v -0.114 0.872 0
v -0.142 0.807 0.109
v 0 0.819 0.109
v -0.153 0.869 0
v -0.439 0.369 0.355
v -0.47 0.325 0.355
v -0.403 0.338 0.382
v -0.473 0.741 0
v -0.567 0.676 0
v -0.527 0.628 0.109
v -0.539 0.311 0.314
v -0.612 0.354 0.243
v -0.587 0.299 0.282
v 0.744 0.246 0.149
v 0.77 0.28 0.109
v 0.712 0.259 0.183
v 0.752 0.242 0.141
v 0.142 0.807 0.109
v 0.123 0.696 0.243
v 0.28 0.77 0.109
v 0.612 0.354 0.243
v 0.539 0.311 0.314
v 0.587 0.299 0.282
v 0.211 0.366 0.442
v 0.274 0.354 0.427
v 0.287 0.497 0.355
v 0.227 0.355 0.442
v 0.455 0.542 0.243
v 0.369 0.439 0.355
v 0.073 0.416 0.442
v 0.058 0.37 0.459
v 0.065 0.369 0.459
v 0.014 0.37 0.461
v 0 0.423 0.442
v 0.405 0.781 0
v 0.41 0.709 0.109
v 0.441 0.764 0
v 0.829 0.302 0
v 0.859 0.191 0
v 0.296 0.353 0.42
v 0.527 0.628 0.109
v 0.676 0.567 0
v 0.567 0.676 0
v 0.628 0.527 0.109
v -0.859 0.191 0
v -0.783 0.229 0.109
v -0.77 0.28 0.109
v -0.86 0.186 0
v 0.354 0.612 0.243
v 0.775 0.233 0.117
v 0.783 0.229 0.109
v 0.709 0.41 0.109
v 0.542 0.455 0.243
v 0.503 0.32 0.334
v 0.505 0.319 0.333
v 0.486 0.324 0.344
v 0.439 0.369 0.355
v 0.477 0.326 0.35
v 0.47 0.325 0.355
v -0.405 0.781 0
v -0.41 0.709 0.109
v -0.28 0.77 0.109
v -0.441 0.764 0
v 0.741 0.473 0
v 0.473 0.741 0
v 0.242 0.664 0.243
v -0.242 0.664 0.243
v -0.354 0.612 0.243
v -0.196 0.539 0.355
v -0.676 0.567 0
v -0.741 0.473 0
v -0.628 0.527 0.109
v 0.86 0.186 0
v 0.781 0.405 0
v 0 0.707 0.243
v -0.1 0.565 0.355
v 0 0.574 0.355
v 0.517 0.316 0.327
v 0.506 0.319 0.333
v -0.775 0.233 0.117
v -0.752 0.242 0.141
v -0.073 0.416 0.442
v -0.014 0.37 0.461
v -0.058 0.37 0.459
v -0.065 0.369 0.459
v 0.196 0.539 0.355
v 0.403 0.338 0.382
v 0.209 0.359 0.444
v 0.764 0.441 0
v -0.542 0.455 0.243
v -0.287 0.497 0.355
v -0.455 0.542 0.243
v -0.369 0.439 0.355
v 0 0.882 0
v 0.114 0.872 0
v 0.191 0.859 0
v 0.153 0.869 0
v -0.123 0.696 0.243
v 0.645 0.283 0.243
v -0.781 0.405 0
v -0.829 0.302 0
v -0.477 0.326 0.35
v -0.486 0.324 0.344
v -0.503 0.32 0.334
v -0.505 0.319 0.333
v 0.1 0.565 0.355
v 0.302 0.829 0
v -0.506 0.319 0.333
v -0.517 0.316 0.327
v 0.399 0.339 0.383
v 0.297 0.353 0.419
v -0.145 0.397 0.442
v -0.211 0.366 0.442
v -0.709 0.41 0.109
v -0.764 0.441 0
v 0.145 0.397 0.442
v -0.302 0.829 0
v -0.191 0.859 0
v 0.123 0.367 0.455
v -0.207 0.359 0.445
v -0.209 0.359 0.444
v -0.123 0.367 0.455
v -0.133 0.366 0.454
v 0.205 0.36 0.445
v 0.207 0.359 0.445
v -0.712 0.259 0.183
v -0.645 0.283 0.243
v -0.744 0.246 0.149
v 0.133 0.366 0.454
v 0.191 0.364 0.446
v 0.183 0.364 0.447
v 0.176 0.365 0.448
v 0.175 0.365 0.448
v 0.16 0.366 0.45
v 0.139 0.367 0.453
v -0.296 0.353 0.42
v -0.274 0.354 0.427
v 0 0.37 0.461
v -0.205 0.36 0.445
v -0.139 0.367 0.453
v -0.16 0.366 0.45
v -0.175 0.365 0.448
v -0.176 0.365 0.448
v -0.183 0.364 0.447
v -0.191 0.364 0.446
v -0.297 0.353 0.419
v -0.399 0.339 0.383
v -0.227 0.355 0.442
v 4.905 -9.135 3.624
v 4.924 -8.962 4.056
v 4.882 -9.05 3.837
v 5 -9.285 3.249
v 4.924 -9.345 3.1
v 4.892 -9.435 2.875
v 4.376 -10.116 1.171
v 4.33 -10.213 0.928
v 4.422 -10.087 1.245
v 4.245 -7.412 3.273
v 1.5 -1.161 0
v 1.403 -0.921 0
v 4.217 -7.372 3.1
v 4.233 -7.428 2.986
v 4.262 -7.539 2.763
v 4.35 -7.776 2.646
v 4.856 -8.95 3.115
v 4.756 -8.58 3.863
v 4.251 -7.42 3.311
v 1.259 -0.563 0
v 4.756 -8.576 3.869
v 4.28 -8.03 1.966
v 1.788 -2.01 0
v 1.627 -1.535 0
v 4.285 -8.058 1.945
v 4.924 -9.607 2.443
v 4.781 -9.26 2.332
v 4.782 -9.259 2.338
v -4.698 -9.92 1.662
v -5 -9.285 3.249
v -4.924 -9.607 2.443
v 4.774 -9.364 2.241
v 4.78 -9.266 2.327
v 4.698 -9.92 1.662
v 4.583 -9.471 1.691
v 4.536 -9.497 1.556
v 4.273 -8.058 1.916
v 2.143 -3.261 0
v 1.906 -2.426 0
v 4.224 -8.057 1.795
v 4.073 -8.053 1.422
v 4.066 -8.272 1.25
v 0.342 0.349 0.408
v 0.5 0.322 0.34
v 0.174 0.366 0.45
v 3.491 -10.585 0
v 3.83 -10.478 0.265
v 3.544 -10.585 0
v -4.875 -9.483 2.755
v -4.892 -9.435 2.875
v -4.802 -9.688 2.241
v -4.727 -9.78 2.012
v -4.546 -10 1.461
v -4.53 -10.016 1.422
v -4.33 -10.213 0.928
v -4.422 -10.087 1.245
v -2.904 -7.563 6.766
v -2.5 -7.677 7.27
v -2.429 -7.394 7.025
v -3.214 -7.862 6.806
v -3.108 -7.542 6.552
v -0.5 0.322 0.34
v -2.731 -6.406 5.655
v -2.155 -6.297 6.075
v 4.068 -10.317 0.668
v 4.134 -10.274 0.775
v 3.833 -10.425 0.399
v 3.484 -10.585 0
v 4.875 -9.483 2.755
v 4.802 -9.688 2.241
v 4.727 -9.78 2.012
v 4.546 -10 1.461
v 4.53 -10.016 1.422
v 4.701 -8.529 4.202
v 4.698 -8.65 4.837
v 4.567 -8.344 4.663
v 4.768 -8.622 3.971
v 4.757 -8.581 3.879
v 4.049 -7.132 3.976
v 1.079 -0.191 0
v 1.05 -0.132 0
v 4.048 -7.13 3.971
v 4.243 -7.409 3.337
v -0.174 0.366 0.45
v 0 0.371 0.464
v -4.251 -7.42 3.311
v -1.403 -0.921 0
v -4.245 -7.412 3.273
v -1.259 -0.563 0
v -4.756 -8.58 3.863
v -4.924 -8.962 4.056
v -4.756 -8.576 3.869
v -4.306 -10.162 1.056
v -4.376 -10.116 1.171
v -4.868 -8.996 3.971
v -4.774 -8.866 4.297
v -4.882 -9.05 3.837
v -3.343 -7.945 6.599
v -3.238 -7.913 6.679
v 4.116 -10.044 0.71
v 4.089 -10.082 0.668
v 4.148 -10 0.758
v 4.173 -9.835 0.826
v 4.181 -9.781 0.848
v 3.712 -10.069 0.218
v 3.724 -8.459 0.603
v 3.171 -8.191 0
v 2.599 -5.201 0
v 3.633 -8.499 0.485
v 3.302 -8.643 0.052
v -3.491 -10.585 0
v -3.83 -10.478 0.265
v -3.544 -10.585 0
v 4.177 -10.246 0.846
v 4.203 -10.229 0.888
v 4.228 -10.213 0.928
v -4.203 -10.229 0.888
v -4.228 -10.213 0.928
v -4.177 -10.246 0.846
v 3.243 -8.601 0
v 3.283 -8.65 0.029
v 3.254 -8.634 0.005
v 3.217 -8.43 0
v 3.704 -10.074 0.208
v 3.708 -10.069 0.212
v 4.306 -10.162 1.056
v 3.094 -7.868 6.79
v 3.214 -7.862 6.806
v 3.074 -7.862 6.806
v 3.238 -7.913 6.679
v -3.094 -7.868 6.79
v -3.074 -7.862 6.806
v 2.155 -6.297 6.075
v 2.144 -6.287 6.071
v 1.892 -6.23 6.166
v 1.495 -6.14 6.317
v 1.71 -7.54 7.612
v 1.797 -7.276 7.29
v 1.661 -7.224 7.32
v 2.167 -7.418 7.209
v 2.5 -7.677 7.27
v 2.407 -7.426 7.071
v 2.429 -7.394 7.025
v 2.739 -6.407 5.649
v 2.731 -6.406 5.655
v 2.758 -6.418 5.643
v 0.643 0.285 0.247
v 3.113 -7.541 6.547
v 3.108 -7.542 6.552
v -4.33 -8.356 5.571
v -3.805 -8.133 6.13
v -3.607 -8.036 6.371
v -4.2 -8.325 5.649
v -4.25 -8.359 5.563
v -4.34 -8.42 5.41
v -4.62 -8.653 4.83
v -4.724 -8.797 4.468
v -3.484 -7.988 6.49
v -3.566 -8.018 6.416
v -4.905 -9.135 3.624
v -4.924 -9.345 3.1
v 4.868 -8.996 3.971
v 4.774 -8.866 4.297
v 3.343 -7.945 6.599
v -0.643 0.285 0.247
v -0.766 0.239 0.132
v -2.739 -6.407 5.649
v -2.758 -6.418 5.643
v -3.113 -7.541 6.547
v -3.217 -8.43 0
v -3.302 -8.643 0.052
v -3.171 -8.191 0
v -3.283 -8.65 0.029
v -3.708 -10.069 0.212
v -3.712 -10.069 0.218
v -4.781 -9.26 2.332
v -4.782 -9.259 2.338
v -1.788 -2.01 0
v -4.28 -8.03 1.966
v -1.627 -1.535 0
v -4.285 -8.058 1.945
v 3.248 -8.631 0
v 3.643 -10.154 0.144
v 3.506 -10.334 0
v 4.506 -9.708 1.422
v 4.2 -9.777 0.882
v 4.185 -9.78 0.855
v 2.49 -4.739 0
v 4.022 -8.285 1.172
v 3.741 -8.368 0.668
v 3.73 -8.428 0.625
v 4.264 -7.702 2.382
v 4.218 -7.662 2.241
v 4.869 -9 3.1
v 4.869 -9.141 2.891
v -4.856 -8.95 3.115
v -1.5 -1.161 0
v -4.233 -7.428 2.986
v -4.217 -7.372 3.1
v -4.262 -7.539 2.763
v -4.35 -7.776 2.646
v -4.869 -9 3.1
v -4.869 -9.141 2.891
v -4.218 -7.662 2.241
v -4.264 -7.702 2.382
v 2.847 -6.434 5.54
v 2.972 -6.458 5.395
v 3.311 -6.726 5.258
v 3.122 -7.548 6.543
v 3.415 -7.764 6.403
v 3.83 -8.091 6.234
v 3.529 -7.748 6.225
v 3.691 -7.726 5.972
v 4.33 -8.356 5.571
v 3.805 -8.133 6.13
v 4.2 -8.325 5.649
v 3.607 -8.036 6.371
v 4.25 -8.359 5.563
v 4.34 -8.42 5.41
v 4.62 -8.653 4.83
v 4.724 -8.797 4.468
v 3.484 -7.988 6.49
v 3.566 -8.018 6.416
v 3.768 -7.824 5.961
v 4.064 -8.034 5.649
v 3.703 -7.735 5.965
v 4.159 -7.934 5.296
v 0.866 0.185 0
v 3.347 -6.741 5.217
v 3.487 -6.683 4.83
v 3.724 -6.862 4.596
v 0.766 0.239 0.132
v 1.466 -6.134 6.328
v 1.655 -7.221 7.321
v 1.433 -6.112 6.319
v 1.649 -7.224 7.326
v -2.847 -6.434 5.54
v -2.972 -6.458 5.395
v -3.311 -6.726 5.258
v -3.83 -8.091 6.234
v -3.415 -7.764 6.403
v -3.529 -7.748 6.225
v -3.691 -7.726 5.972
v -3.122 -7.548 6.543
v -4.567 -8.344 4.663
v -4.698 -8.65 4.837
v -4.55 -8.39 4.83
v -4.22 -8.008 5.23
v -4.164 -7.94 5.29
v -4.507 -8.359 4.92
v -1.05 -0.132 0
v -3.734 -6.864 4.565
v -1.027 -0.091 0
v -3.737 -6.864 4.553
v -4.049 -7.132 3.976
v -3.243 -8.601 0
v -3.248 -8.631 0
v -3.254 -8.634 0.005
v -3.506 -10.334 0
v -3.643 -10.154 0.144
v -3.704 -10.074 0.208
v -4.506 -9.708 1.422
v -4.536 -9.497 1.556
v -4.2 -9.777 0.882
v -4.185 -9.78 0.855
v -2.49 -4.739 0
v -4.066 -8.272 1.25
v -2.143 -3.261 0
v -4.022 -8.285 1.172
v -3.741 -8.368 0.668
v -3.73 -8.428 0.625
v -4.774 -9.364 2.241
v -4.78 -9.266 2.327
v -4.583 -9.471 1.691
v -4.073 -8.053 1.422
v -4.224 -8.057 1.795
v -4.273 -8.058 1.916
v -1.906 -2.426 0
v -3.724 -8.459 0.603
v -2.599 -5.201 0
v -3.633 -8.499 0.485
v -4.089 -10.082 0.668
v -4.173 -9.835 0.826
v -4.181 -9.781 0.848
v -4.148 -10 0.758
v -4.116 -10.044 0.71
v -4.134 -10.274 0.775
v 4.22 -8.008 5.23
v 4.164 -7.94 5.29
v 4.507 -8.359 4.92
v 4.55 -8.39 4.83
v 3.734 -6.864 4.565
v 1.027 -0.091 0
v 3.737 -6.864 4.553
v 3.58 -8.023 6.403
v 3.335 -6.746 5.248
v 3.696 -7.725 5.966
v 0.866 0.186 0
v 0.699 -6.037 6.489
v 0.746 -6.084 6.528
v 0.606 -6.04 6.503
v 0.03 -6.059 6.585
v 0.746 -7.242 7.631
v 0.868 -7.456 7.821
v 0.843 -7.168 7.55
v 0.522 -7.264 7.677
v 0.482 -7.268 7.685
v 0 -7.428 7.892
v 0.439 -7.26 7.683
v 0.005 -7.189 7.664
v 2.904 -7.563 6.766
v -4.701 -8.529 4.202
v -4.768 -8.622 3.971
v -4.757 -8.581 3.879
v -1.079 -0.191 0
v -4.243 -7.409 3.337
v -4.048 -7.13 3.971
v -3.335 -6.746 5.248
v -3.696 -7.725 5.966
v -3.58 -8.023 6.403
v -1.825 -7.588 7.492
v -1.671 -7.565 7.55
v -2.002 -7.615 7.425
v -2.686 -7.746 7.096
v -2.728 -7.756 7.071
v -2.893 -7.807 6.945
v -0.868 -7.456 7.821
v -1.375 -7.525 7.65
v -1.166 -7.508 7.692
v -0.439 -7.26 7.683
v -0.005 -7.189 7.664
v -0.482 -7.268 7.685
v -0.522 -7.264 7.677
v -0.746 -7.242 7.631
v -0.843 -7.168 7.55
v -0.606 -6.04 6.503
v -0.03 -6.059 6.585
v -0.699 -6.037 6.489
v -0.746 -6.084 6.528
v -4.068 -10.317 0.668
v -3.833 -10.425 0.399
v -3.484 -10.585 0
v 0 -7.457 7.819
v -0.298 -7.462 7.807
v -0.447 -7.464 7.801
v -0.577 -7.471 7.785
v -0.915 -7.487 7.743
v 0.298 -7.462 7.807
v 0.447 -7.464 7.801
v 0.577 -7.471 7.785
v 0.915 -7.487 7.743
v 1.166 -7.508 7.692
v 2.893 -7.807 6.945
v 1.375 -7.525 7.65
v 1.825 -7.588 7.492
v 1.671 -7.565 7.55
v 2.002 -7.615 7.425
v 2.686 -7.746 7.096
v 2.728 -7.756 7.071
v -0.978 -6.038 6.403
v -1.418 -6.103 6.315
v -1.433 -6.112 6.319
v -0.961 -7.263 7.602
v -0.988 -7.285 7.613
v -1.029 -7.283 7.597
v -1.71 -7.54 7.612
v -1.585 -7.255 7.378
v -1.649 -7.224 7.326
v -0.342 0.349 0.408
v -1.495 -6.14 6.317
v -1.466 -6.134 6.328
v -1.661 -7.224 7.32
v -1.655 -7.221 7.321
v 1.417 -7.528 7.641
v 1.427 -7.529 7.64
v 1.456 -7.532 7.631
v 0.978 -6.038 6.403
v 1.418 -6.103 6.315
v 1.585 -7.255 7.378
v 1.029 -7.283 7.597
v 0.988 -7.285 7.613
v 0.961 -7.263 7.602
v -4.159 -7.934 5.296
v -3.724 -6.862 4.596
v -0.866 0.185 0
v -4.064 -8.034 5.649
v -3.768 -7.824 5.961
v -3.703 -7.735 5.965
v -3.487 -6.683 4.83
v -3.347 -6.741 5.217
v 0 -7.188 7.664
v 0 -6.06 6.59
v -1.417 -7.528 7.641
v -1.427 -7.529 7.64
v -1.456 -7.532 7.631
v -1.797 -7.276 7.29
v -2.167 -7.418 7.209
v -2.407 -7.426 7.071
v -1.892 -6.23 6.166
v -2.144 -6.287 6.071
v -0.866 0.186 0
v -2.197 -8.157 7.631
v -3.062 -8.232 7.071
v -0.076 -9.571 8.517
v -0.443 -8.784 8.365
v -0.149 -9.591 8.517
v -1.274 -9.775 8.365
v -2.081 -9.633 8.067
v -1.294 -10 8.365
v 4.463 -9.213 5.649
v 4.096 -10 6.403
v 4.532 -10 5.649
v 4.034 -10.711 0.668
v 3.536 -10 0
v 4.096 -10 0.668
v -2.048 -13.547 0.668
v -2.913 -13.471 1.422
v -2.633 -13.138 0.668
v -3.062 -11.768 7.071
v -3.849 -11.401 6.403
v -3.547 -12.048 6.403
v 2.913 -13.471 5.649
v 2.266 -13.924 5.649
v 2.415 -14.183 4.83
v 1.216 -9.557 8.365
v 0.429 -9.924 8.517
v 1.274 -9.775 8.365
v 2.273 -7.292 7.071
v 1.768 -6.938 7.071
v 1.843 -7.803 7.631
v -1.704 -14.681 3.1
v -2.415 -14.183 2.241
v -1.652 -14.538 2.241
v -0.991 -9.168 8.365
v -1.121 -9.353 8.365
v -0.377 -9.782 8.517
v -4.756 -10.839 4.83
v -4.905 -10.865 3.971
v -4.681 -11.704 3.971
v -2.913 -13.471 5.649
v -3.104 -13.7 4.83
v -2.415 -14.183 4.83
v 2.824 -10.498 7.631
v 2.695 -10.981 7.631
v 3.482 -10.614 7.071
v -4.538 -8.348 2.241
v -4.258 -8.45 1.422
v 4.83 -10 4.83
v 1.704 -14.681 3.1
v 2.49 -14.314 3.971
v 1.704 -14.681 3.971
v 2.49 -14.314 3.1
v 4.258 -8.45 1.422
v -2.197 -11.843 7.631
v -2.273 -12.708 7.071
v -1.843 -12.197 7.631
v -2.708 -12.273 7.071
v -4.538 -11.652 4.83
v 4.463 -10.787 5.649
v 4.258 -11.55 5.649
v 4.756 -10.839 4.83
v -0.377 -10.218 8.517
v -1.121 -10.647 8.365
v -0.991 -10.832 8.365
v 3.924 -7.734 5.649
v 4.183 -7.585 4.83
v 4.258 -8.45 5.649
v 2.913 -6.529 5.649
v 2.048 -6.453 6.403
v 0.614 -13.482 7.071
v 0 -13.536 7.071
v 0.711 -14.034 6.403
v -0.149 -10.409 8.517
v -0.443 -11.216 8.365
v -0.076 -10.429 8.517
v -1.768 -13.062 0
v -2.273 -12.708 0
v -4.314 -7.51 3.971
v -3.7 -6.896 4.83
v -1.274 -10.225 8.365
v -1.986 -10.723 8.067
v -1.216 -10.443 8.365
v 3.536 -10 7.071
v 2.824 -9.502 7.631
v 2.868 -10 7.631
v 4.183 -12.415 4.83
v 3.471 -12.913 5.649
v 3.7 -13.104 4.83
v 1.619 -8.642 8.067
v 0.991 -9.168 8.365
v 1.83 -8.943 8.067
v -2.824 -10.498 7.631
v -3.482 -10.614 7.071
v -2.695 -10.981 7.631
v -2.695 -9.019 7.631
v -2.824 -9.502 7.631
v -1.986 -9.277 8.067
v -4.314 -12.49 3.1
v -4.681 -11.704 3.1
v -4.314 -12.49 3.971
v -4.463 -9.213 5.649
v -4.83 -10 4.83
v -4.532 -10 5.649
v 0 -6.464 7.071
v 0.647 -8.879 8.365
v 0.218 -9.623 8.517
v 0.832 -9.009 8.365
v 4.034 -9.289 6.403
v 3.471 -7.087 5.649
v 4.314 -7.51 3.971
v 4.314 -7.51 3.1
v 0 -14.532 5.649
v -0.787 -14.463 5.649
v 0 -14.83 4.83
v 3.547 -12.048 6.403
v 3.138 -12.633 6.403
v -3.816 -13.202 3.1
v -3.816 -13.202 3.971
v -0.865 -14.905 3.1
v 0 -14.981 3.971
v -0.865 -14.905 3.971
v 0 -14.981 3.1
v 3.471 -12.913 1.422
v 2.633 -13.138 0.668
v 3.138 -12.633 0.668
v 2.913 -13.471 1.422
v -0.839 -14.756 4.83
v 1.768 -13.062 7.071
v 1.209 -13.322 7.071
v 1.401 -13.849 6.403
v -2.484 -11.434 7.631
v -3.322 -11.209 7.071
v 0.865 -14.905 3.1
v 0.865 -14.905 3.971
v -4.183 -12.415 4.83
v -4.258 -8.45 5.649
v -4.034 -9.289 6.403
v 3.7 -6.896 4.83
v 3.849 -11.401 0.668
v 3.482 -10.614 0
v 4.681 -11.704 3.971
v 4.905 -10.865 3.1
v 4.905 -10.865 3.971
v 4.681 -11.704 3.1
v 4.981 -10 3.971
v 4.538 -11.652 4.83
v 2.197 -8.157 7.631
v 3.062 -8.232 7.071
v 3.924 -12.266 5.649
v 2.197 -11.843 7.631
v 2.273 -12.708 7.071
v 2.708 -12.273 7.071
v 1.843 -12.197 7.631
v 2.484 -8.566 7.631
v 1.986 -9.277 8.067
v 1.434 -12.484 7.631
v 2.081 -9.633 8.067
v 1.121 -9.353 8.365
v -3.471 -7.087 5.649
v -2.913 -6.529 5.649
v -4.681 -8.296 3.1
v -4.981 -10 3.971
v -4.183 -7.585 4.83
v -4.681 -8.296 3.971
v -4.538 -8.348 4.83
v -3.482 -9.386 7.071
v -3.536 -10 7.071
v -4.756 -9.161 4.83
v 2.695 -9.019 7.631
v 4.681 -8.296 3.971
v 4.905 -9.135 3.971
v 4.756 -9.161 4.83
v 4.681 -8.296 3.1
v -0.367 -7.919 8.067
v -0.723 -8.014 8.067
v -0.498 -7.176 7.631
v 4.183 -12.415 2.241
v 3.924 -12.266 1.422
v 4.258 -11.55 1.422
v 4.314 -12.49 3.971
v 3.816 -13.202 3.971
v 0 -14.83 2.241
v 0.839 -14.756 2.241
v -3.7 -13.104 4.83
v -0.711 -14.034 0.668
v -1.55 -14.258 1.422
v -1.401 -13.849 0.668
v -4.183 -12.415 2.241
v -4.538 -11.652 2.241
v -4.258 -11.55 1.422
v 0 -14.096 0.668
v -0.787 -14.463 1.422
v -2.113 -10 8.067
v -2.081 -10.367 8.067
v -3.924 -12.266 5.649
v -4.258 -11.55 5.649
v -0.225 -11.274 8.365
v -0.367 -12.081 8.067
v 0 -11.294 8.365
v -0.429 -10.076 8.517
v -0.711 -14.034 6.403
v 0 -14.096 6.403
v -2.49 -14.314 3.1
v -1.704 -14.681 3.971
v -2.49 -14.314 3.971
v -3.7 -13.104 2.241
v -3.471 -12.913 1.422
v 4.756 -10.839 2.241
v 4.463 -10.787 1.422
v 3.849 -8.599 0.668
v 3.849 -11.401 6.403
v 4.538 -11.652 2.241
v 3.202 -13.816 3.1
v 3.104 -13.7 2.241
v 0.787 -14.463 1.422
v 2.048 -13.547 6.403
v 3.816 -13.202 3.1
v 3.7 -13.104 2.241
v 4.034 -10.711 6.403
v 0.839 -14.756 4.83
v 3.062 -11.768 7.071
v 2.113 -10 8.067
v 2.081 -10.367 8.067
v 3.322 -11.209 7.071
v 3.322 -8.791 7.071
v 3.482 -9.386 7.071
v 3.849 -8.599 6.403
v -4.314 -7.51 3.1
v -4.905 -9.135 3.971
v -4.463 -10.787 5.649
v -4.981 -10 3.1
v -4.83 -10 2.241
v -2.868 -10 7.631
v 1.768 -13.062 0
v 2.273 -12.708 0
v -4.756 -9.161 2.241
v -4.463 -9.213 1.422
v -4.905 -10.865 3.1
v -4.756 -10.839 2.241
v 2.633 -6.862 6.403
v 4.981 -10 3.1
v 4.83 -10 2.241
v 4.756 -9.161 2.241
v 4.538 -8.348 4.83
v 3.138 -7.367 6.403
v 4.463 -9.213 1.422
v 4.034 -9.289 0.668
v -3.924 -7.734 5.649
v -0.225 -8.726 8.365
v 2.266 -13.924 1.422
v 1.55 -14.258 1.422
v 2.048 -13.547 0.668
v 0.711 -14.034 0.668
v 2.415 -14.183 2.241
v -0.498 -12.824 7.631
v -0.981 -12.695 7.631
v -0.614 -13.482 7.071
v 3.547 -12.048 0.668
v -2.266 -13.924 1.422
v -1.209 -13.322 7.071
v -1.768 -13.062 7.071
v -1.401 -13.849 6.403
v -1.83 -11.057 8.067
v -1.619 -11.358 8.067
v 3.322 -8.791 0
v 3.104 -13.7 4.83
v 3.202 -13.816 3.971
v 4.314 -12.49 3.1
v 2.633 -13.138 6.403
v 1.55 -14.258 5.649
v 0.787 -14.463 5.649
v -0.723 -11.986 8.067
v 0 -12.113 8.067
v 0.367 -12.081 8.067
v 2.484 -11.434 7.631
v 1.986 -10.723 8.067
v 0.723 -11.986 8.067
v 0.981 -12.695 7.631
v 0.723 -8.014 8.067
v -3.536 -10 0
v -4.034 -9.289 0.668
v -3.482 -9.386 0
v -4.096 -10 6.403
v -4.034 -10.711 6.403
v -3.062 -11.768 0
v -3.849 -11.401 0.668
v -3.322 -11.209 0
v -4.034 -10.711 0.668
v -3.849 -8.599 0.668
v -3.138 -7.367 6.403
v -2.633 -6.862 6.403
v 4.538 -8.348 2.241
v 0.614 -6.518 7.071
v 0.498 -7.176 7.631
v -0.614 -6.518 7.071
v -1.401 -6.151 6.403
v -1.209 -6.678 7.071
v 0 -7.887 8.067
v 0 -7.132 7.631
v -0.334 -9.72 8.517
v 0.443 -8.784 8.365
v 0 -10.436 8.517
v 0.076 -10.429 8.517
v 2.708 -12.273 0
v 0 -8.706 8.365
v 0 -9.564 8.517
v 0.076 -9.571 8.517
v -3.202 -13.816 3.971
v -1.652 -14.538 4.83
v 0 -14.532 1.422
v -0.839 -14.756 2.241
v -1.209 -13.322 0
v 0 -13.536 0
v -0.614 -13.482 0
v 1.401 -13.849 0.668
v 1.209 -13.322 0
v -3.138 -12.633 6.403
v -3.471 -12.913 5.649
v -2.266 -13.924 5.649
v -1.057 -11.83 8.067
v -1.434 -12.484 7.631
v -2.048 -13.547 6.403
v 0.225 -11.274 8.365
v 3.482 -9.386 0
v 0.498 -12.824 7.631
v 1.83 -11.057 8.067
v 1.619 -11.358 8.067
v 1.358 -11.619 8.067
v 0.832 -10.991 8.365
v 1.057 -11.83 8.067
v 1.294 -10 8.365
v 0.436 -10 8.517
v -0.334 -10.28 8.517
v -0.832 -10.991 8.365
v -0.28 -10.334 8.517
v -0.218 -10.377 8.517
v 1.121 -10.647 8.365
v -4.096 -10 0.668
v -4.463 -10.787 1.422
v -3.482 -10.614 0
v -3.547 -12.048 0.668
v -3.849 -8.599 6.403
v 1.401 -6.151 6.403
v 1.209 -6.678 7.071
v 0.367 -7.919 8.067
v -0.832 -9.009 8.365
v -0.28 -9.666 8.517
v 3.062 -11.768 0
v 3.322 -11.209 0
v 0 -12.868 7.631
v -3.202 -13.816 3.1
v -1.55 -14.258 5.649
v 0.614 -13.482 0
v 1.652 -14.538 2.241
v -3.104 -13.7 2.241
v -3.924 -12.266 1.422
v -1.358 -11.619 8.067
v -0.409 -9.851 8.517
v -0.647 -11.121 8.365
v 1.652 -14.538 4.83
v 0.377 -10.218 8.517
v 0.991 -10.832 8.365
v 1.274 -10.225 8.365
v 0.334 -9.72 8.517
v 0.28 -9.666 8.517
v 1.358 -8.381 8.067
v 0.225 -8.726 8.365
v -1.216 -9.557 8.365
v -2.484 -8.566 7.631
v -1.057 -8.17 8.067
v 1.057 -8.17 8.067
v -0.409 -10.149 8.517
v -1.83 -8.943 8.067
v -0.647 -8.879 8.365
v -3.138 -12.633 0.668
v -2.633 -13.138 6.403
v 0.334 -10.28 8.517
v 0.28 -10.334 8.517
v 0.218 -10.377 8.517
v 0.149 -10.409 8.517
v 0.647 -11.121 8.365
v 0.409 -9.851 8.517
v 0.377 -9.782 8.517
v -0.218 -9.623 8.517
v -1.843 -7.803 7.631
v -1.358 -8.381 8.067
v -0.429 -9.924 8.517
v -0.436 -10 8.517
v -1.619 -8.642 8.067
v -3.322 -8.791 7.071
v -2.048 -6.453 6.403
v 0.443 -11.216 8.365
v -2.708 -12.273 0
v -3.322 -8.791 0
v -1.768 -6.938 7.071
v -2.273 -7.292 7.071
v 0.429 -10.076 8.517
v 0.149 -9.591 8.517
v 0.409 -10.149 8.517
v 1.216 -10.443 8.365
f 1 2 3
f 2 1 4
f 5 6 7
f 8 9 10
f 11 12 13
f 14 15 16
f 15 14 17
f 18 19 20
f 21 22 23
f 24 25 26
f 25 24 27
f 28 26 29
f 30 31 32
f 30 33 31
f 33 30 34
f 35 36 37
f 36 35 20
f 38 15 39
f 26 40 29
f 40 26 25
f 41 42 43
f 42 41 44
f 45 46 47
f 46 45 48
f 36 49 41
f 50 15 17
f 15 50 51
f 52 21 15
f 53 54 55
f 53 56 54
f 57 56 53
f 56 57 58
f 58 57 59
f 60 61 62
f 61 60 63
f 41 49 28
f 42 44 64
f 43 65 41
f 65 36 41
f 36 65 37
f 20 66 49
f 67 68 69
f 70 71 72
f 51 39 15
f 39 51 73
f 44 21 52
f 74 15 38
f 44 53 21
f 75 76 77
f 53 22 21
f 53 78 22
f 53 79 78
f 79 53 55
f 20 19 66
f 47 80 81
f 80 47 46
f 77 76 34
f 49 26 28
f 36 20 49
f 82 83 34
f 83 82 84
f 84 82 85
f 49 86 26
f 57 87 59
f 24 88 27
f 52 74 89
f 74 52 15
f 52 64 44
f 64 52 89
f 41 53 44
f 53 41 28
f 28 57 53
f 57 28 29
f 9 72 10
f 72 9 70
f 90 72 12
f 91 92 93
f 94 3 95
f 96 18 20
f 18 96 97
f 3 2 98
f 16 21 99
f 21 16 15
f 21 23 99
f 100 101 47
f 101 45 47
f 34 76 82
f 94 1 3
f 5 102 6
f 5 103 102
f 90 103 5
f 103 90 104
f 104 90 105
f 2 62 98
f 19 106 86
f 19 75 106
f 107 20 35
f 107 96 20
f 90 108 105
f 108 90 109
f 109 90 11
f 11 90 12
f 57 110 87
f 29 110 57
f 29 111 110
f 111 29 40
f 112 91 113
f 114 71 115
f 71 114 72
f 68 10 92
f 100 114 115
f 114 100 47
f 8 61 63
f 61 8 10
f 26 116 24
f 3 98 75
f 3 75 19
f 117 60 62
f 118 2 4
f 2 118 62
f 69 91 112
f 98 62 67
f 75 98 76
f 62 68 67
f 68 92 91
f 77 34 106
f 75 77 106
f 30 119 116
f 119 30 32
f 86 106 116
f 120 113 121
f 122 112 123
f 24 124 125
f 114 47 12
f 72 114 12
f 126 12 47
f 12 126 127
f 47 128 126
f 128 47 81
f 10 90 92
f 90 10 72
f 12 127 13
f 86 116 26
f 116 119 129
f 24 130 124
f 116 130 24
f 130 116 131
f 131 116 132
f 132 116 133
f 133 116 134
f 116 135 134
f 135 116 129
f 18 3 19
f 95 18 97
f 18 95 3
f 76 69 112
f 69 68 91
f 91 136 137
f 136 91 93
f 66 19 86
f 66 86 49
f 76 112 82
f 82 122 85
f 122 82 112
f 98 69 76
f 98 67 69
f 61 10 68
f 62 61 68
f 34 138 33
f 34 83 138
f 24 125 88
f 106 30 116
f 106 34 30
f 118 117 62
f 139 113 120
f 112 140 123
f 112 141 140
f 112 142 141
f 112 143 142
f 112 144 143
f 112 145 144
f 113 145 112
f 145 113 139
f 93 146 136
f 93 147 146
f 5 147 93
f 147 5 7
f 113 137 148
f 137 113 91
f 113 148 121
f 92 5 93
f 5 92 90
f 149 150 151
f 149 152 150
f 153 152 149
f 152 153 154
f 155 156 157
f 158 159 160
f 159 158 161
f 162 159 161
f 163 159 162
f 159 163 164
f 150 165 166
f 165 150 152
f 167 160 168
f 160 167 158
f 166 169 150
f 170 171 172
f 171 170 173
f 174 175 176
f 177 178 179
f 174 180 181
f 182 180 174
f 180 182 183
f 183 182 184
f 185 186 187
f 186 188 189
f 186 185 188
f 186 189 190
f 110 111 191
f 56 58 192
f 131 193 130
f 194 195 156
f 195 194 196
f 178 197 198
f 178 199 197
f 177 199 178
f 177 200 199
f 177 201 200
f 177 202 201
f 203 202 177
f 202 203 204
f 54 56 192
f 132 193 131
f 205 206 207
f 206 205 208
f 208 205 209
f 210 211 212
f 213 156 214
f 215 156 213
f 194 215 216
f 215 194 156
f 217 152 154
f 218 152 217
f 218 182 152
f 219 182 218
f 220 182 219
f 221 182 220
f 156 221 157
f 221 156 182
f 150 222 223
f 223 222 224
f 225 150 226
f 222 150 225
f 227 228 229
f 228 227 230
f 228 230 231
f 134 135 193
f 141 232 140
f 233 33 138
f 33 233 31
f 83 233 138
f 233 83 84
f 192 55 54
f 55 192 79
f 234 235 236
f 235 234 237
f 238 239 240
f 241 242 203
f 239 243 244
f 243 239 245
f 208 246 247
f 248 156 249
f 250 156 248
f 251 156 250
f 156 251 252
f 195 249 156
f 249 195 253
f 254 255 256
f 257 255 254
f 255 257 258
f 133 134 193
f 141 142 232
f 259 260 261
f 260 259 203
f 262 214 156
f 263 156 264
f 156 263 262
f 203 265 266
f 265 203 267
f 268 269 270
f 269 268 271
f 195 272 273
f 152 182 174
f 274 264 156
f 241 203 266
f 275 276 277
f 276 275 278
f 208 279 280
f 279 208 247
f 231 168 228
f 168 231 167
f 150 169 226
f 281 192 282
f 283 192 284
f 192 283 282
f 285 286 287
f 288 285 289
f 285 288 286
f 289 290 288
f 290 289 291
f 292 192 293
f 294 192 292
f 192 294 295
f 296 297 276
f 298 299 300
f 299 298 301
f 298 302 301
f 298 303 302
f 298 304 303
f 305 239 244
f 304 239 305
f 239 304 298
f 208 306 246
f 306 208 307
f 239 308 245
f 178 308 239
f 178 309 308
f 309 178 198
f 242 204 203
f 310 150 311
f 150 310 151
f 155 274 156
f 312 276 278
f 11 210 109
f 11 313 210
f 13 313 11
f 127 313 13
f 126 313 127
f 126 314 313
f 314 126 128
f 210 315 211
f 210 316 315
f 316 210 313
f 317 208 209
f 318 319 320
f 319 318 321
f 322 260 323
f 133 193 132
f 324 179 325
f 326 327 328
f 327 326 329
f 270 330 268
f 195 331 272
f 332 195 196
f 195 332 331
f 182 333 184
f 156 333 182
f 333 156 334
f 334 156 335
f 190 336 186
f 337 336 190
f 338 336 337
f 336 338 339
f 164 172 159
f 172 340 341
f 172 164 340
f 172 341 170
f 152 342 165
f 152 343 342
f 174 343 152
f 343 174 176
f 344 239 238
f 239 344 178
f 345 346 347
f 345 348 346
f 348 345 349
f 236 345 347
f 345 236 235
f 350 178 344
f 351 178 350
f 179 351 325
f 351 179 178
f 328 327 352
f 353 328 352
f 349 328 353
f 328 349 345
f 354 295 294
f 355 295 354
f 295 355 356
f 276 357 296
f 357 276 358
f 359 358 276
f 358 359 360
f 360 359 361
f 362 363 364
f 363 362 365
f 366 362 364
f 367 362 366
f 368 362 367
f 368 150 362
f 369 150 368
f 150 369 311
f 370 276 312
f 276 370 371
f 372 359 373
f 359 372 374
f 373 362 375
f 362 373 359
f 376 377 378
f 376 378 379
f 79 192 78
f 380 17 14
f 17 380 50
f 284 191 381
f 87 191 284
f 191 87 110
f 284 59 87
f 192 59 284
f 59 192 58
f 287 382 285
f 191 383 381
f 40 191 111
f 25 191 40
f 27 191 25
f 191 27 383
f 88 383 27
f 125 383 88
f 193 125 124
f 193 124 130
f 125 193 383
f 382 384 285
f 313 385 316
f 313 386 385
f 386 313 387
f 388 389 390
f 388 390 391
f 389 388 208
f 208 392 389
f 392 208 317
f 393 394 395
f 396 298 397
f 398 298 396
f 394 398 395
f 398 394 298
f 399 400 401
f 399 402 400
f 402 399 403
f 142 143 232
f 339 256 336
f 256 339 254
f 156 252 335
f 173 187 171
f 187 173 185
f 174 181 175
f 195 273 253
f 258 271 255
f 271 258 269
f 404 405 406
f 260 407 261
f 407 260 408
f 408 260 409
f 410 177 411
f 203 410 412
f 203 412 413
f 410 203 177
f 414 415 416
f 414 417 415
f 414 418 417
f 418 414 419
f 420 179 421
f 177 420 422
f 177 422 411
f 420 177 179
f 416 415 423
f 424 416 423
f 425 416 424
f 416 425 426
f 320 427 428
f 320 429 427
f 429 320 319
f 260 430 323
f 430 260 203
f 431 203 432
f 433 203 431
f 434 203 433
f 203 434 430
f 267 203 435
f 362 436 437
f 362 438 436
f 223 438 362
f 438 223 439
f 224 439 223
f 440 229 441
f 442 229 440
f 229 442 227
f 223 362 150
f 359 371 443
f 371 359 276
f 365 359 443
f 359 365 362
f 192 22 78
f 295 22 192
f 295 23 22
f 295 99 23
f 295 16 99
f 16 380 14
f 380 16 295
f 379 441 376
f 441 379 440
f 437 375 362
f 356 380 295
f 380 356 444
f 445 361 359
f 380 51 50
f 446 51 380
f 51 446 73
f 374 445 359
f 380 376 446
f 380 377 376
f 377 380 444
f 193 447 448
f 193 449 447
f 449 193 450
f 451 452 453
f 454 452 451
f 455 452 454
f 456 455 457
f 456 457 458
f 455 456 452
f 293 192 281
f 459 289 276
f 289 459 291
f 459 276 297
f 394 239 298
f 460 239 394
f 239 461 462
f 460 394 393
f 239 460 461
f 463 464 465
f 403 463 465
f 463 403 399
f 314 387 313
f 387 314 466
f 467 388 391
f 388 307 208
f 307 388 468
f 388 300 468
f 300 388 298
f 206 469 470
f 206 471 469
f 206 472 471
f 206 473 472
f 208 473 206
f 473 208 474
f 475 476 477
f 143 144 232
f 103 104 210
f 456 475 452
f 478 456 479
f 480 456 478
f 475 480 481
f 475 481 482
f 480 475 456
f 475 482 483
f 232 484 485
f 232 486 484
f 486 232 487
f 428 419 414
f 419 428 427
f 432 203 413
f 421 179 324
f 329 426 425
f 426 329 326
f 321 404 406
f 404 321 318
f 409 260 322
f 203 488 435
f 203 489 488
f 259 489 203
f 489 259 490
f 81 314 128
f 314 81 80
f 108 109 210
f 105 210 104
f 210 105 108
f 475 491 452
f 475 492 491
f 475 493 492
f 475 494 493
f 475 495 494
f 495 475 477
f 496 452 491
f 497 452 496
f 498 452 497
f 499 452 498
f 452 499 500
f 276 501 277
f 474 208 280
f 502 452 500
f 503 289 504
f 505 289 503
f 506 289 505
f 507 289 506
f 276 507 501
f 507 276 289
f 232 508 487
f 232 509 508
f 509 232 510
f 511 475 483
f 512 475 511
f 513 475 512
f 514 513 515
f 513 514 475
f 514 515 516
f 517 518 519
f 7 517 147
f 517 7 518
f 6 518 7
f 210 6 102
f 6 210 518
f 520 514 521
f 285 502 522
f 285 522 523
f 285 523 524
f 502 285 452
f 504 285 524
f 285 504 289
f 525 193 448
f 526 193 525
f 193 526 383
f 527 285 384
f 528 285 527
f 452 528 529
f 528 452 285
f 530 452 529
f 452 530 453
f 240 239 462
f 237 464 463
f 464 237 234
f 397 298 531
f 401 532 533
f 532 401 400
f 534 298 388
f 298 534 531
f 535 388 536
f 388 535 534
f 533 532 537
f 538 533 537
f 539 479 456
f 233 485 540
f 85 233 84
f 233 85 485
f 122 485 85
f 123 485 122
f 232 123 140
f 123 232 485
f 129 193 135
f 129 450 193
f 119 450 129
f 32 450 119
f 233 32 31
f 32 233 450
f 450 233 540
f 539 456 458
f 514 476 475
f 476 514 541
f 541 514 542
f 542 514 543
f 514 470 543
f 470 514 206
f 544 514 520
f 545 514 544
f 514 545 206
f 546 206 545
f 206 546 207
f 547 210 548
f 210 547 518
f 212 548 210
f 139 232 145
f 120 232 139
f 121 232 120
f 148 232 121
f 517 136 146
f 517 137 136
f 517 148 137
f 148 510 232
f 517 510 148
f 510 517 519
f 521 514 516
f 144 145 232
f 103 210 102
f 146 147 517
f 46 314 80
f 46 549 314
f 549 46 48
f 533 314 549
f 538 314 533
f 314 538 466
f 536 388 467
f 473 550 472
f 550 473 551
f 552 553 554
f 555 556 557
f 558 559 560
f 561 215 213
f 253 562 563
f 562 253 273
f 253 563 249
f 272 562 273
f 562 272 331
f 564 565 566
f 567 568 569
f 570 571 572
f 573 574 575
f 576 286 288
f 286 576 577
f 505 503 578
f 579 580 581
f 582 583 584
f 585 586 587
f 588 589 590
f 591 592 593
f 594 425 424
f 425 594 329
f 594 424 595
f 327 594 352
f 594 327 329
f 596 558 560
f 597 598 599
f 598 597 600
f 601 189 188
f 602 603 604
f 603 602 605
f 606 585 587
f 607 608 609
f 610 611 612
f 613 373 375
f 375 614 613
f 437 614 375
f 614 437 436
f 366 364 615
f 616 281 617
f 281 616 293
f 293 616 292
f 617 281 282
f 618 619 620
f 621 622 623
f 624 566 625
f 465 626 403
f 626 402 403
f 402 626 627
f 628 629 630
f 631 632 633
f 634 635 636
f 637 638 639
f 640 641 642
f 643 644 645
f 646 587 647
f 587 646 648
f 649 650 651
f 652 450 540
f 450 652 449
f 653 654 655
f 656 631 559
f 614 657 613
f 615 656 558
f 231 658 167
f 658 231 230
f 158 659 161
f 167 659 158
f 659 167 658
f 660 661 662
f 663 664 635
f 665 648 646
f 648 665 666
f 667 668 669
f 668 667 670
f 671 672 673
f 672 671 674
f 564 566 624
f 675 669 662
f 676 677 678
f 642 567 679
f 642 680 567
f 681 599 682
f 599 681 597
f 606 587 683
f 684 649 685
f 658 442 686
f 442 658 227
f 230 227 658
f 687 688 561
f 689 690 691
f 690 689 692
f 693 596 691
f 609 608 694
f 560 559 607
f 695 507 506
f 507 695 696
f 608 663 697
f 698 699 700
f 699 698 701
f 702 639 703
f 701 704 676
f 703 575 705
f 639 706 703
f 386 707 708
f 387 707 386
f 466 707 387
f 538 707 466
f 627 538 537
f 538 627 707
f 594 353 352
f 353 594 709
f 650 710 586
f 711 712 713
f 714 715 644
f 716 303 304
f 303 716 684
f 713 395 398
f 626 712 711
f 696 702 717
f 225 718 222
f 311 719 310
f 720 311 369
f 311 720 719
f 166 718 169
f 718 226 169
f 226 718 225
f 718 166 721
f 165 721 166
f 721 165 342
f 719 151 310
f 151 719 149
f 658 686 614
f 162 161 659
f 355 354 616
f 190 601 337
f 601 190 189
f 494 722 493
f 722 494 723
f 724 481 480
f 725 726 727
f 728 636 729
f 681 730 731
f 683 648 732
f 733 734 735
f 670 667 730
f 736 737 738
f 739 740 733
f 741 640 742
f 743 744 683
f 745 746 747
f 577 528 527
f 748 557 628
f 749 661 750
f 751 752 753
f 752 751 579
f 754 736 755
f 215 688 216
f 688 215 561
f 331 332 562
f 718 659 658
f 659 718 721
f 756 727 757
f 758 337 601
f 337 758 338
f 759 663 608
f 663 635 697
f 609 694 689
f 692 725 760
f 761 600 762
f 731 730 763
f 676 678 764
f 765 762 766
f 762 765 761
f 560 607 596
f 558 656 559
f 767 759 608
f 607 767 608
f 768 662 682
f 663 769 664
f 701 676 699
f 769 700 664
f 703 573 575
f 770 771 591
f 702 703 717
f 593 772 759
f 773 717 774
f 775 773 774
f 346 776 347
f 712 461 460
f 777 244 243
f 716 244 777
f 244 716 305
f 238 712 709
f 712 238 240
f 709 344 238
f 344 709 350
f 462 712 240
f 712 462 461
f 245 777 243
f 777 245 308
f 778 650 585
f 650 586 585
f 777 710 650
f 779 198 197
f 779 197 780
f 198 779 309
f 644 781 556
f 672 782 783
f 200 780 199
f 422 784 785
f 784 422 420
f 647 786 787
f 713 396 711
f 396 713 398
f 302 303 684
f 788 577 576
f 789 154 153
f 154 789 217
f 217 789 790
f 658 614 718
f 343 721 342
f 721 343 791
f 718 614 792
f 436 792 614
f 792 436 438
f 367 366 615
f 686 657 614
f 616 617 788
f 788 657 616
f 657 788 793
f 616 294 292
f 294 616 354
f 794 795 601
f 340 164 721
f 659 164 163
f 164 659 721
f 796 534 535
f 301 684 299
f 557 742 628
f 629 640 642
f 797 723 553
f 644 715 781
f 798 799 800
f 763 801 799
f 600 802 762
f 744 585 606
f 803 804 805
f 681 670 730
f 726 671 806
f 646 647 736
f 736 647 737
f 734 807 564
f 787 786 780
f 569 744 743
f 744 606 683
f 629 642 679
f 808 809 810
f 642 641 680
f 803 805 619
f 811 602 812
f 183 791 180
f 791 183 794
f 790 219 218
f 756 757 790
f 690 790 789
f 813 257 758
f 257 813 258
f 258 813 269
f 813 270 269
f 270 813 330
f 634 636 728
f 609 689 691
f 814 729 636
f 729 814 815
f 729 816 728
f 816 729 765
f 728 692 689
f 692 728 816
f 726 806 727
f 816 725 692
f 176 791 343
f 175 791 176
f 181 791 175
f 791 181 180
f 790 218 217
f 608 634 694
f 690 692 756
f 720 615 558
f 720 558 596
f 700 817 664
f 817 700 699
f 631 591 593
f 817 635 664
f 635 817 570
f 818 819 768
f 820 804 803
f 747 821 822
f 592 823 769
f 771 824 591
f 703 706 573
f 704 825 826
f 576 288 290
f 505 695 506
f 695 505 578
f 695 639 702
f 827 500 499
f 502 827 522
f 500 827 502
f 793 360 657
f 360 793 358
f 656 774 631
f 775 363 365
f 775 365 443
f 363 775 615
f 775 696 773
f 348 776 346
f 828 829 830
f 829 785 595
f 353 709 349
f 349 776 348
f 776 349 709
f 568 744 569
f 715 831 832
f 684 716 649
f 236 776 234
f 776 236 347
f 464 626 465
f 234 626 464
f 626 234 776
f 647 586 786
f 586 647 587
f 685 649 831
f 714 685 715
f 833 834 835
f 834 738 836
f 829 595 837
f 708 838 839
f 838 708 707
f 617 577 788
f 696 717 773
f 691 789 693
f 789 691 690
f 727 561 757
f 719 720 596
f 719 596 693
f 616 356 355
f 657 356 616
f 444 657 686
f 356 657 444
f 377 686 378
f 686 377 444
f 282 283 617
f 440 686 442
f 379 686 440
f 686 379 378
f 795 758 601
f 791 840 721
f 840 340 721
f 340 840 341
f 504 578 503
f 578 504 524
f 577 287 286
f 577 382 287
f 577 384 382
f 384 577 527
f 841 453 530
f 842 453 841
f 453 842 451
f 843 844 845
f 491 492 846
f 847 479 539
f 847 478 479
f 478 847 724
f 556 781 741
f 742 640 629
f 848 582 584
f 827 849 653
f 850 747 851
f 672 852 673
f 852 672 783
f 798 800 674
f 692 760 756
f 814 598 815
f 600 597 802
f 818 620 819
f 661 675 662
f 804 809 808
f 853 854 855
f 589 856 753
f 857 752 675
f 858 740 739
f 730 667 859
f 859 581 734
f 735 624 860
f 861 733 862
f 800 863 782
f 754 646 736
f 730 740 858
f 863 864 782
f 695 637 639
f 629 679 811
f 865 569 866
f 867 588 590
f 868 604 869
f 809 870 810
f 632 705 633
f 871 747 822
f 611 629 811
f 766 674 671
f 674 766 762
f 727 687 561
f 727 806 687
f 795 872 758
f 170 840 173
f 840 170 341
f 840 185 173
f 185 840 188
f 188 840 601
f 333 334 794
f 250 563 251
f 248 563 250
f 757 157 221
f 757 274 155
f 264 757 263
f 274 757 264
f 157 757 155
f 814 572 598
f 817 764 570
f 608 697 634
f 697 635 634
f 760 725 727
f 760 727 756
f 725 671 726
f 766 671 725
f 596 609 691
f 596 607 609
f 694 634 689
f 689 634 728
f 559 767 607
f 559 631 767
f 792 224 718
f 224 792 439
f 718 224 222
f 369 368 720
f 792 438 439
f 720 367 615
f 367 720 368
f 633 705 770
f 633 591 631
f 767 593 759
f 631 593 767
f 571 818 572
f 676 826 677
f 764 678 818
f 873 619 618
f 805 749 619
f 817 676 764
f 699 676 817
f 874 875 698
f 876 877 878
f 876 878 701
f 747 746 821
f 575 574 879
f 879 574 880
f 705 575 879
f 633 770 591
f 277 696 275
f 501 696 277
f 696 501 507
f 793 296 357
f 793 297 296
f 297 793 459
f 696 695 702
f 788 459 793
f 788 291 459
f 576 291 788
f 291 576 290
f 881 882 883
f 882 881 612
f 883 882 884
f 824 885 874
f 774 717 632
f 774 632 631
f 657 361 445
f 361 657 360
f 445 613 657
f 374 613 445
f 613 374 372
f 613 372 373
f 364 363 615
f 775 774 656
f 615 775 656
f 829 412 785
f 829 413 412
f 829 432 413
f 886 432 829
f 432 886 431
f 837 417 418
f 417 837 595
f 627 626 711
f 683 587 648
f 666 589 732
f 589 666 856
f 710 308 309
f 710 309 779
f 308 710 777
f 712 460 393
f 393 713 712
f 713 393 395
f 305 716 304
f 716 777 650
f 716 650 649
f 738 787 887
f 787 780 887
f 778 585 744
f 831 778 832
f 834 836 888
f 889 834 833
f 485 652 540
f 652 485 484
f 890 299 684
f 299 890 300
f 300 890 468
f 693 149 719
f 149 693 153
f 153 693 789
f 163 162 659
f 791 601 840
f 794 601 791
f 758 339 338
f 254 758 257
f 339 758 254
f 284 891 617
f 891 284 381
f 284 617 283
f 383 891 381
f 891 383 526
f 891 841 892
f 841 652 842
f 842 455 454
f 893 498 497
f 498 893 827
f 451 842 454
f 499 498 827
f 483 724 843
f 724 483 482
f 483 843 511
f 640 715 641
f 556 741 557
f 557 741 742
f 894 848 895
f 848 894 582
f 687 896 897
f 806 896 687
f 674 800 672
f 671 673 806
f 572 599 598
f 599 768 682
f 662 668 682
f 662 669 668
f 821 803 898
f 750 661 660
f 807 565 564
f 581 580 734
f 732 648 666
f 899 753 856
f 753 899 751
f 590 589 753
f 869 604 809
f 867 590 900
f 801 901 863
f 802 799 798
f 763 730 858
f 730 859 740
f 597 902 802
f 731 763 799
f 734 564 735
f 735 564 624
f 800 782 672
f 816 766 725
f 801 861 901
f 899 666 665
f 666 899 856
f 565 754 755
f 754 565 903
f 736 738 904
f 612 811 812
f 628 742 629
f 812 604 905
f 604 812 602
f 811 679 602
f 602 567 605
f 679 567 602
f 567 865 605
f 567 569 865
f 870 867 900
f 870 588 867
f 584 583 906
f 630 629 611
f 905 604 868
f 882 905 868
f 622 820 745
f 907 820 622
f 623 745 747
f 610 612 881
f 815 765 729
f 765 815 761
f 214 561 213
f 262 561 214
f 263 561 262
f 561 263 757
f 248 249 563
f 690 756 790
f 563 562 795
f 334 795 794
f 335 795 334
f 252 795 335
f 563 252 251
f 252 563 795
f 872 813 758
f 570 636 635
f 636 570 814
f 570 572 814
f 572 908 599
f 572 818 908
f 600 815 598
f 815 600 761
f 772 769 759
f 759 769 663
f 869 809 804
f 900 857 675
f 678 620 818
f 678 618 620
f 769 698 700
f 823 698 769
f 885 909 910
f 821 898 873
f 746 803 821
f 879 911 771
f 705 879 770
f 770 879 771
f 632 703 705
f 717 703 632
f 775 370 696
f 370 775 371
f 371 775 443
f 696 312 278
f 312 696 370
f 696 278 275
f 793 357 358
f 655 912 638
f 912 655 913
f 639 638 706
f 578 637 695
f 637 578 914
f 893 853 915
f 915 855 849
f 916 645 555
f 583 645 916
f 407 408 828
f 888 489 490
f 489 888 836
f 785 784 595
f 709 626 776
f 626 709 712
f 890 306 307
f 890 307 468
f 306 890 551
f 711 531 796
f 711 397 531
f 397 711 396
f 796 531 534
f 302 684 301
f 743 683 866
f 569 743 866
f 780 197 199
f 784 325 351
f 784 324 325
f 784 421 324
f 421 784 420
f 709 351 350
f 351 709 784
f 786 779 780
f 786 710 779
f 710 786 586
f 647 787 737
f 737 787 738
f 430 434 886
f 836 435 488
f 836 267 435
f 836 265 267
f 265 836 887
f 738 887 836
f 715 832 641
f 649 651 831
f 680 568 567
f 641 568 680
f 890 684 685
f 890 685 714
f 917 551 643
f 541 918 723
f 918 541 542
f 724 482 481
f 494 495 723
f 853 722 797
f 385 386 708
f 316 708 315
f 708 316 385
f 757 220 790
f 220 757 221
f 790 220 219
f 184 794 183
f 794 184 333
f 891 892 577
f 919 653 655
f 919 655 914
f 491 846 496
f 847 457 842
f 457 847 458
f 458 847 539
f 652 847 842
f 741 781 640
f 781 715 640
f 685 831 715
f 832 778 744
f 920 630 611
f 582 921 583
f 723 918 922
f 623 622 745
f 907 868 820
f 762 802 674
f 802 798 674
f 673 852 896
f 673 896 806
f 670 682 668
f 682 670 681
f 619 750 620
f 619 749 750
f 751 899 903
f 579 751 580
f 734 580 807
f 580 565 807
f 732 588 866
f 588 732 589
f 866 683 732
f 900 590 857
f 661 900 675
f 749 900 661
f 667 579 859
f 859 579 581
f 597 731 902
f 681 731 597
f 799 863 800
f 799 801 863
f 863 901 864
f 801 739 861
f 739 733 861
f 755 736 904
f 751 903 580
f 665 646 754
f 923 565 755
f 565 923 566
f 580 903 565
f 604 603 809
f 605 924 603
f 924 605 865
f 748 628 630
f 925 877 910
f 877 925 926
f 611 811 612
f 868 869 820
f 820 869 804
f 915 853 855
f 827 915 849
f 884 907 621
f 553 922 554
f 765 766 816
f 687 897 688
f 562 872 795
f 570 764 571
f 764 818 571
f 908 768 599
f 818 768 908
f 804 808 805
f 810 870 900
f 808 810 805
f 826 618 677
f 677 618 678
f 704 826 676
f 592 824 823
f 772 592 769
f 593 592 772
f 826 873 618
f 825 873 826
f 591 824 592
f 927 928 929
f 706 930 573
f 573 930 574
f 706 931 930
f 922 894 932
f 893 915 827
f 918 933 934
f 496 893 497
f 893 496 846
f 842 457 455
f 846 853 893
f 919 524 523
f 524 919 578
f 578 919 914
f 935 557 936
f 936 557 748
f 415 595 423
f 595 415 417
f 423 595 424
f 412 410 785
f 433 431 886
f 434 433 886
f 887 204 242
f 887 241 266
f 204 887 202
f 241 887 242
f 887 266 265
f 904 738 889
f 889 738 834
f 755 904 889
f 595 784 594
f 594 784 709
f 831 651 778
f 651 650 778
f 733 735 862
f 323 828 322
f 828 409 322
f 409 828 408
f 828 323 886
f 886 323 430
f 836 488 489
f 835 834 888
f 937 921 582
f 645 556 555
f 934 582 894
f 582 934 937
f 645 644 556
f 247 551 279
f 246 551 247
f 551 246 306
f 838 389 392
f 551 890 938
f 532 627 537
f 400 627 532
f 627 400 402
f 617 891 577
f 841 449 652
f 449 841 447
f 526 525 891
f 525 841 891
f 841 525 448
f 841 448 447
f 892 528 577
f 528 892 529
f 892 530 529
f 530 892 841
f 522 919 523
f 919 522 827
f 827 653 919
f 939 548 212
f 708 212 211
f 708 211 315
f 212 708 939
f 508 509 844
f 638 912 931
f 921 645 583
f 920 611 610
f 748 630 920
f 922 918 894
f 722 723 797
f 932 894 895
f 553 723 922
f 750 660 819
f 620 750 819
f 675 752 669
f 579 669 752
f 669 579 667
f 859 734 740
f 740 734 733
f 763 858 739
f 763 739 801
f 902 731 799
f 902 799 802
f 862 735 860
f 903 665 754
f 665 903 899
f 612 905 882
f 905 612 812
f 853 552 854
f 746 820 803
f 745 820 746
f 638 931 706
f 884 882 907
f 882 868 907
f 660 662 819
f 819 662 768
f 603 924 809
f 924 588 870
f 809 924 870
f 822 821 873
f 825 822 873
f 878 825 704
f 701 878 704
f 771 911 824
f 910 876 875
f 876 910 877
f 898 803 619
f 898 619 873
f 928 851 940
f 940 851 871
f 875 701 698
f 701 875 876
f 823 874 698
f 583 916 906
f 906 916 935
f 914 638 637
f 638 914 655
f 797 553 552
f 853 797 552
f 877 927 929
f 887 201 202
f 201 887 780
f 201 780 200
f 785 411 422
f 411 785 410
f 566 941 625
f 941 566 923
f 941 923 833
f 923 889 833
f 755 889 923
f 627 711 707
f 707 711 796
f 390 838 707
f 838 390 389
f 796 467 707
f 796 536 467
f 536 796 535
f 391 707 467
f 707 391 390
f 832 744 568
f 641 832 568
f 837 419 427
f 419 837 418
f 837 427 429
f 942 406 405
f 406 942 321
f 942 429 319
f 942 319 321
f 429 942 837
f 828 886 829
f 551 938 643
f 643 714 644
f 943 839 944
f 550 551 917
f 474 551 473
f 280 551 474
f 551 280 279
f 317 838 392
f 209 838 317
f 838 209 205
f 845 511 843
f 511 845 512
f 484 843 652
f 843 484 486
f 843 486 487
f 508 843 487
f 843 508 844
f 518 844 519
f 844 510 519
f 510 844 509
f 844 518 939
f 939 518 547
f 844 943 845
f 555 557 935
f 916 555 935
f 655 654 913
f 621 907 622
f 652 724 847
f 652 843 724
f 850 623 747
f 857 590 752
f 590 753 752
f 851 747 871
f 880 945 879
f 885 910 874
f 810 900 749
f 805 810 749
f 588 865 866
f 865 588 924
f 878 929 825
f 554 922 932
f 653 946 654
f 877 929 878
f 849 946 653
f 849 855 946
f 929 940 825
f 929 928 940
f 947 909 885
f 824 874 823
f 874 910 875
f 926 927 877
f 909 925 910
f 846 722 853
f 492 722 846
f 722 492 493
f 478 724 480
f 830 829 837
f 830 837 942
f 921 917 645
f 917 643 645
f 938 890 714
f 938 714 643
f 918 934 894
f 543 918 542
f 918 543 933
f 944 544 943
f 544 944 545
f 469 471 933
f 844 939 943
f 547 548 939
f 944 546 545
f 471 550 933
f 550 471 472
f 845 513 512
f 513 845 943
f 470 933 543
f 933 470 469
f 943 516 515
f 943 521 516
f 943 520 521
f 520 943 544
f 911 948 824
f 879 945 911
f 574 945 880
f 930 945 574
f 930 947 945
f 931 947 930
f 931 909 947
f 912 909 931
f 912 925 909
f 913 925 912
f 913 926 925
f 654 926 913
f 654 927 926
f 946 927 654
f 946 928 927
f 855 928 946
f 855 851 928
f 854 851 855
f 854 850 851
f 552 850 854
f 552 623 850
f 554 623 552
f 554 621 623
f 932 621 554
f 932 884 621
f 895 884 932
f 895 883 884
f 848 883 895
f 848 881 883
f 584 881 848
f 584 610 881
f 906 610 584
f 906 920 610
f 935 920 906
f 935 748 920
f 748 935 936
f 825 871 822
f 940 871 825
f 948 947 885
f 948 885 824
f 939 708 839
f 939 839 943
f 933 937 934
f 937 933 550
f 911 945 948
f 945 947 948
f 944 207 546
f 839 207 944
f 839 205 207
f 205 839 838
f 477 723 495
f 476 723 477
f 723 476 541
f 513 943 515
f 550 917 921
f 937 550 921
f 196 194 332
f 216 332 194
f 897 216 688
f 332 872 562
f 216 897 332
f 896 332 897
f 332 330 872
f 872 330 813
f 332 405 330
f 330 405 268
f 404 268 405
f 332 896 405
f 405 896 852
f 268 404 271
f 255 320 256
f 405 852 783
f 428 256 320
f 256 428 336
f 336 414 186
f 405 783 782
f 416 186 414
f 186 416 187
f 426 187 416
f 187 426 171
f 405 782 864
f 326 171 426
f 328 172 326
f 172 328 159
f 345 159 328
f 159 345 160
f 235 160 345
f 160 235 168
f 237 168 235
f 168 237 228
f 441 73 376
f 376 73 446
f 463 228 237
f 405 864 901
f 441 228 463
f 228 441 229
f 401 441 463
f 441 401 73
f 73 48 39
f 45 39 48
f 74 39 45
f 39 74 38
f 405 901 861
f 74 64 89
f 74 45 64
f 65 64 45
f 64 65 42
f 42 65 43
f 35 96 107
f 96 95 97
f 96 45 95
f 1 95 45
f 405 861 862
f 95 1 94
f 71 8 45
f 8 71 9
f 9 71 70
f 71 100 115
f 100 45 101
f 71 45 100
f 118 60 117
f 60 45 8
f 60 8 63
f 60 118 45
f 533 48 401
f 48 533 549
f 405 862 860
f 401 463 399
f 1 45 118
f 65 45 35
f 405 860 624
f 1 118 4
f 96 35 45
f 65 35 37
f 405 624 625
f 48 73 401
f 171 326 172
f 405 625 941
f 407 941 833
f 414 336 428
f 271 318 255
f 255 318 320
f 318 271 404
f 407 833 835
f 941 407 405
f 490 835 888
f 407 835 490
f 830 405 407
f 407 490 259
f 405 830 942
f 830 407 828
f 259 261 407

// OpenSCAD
// radiused_rod.scad
// https://www.thingiverse.com/thing:6079195

        use <MCAD/regular_shapes.scad>

d1 = 2;
d2 = 10;
length = 10;

overhang_angle = 45;

$fn=36;
eps = 0.0001;



// shaft with a ball on the end, flattened for printing

radiused_shaft();

dmin=min(d1,d2);
dmax = max(d1,d2);

module radiused_shaft(){

difference(){
translate([0,0,cos(overhang_angle)* dmax/2]) bit1();
translate([0-dmax/2,-length-dmax-eps,-dmax])cube([dmax,length+4*dmax,dmax]);
}
}
module bit1(d1=d1,d2=d2){
    module end(d){sphere(d=d);}
    module rod(){
        rotate([90+atan((d1-d2)/length/2),0,0])
            cylinder(d1=d1,d2=d2,h=length);
    }
    {
        translate([0,0,-(d2-d1)/2]) end(d1);
        translate([0,0,-(d2-d1)/2]) rod();
        translate([0,-length,0]) end(d2);
    }
}
